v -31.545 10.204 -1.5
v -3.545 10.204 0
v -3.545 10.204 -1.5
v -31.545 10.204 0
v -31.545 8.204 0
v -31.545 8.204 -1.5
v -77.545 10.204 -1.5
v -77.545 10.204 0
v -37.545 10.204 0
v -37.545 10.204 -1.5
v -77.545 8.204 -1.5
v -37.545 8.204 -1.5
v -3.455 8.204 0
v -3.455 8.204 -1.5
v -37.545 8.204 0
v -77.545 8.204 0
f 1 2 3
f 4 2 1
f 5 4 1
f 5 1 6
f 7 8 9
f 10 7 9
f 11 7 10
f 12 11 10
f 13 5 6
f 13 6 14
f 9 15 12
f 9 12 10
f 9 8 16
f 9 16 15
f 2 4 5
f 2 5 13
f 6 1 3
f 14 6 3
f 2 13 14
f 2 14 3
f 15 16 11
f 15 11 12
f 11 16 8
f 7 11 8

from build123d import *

# Parameters (mm, degrees)
SKETCH1_W             = 40
SKETCH1_H             = 2
BOSS_EXTRUDE1_DEPTH   = 1.5
BOSS_EXTRUDE1_2_DEPTH = 1.5


with BuildPart() as part:
    # Sketch1 → Boss-Extrude1 (new body)
    with BuildSketch(Plane.XY):
        with Locations((-57.544619595, 9.204483614)):
            Rectangle(SKETCH1_W, SKETCH1_H)
    extrude(amount=-BOSS_EXTRUDE1_DEPTH)


with BuildPart() as body_2:
    # Sketch1 → Boss-Extrude1 2 (new body)
    with BuildSketch(Plane.XY):
        Polygon((-31.544619595, 10.204483614), (-31.544619595, 8.204483614), (-3.454836204, 8.204483614), (-3.544619595, 10.204483614), align=None)
    extrude(amount=-BOSS_EXTRUDE1_2_DEPTH)


solid = Compound([part.part, body_2.part])
